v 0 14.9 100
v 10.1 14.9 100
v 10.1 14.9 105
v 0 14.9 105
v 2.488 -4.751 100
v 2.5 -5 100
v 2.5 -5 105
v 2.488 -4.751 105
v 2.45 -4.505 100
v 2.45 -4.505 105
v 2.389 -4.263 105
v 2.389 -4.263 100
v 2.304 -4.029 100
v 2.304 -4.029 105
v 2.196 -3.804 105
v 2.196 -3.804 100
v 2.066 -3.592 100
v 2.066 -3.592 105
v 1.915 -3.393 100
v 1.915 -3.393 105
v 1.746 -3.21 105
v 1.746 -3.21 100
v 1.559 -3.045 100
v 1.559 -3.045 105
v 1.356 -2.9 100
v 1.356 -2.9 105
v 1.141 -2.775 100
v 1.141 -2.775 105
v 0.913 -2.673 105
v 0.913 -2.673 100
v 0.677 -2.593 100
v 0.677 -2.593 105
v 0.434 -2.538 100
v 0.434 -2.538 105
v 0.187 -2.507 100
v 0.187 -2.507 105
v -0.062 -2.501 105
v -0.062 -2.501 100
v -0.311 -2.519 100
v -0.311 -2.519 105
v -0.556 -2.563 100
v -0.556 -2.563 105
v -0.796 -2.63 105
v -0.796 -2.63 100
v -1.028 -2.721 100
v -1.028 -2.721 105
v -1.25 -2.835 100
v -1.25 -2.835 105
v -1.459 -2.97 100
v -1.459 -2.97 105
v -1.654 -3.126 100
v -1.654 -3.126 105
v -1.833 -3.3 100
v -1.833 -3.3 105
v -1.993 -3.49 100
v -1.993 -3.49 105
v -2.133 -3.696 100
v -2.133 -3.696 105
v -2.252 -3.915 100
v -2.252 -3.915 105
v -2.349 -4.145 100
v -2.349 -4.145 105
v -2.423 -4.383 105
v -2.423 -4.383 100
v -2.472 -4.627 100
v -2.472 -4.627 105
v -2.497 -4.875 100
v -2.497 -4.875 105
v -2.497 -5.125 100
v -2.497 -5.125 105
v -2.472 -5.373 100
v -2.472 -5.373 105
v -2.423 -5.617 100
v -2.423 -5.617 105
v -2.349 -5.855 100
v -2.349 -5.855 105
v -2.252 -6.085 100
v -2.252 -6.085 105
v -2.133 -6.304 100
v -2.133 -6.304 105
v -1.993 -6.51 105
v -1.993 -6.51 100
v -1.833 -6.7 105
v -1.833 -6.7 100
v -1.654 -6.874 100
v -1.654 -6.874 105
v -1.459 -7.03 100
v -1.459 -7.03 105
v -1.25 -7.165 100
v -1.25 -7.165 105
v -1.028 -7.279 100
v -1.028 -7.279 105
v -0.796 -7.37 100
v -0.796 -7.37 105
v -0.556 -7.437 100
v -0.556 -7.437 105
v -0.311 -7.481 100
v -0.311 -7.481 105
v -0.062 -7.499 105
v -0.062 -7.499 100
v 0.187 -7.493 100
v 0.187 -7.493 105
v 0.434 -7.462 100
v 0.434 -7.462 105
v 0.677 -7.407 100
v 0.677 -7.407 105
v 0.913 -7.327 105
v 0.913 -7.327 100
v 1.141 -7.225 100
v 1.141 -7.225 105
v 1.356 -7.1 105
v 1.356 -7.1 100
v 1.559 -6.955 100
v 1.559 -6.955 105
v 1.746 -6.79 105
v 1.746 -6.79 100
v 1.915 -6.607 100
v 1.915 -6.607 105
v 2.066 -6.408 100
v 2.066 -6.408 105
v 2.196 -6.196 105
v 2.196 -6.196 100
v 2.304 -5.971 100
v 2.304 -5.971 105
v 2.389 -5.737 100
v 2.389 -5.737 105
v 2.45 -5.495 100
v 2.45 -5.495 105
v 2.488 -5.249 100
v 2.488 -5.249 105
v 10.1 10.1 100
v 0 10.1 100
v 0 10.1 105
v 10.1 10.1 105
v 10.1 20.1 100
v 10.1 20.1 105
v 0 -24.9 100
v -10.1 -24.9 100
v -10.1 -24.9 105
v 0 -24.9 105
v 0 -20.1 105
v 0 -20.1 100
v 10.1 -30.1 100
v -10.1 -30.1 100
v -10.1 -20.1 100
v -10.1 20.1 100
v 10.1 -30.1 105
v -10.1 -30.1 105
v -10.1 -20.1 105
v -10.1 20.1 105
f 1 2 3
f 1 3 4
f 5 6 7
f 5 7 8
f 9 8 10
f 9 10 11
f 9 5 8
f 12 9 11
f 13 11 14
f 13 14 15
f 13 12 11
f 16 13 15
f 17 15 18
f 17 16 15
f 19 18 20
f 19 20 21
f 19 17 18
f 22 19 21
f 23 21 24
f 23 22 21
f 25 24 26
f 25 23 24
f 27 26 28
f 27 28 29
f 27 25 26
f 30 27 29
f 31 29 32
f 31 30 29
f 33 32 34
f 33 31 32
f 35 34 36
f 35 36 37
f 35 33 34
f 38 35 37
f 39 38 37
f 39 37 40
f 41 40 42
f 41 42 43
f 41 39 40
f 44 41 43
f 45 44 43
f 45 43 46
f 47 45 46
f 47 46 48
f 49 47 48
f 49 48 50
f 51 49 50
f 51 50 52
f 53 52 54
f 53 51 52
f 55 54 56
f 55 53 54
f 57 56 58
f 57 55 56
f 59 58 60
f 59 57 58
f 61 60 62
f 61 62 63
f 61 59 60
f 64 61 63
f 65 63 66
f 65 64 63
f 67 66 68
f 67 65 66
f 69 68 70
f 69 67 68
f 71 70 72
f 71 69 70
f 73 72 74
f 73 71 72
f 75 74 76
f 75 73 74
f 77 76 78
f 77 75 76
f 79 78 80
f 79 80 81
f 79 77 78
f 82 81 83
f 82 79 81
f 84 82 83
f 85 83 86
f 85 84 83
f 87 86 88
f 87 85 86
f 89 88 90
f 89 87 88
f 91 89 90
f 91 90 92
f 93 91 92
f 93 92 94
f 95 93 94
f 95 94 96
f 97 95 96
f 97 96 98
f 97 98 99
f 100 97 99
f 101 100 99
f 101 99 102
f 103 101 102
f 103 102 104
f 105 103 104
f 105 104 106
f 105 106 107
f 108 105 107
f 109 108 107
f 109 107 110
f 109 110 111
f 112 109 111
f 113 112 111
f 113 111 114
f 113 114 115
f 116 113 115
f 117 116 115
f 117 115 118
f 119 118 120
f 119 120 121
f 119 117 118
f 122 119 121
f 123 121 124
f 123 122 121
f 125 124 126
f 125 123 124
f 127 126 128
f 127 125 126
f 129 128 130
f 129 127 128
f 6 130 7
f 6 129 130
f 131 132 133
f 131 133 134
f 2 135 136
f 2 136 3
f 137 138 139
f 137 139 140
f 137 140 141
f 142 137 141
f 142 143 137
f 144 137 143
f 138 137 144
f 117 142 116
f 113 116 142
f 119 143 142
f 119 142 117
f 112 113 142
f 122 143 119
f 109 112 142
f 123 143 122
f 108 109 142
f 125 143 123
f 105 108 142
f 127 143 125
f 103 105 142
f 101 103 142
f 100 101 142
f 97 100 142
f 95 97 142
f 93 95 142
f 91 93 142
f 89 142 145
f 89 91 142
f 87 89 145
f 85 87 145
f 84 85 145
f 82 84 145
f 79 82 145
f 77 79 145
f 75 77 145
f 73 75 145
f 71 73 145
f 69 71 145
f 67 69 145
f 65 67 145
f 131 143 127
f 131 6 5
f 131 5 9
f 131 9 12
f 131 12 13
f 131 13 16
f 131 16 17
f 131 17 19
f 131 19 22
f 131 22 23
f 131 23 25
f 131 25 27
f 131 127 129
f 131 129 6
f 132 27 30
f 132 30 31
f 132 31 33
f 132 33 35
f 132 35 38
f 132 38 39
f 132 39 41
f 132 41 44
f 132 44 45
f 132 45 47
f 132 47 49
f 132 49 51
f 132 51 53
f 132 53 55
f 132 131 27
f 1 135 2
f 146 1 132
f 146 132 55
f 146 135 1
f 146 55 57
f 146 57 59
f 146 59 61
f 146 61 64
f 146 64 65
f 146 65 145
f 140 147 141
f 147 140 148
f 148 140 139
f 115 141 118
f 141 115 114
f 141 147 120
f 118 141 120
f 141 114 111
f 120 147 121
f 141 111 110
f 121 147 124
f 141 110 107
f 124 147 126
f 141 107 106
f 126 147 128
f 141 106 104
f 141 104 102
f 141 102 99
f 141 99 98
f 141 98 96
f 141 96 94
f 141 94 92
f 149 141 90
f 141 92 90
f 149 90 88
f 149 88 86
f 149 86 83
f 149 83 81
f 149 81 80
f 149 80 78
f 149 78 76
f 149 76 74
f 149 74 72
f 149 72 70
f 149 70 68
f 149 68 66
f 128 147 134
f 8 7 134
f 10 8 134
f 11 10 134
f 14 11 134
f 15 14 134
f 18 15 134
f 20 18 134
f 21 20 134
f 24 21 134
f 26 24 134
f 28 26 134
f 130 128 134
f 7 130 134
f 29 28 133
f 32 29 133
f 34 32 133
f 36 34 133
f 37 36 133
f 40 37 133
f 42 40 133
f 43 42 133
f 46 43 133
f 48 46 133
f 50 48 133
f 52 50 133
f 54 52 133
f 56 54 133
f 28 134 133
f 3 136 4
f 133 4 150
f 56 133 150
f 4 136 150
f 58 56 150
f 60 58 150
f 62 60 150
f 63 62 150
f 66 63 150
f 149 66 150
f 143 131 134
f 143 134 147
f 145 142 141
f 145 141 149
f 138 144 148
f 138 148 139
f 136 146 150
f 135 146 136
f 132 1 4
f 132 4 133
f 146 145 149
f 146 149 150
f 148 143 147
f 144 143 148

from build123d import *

# Parameters (mm, degrees)
SKETCH012_R = 2.5
PAD_DEPTH   = 5


with BuildPart() as part:
    # Sketch012 → Pad (new body)
    with BuildSketch(Plane(origin=(0, -5, 100), x_dir=(1, 0, 0), z_dir=(0, 0, 1))):
        Polygon((-10.1, 25.1), (10.1, 25.1), (10.1, 19.9), (0, 19.9), (0, 15.1), (10.1, 15.1), (10.1, -25.1), (-10.1, -25.1), (-10.1, -19.9), (0, -19.9), (0, -15.1), (-10.1, -15.1), align=None)
        Circle(SKETCH012_R, mode=Mode.SUBTRACT)
    extrude(amount=PAD_DEPTH)


solid = part.part
